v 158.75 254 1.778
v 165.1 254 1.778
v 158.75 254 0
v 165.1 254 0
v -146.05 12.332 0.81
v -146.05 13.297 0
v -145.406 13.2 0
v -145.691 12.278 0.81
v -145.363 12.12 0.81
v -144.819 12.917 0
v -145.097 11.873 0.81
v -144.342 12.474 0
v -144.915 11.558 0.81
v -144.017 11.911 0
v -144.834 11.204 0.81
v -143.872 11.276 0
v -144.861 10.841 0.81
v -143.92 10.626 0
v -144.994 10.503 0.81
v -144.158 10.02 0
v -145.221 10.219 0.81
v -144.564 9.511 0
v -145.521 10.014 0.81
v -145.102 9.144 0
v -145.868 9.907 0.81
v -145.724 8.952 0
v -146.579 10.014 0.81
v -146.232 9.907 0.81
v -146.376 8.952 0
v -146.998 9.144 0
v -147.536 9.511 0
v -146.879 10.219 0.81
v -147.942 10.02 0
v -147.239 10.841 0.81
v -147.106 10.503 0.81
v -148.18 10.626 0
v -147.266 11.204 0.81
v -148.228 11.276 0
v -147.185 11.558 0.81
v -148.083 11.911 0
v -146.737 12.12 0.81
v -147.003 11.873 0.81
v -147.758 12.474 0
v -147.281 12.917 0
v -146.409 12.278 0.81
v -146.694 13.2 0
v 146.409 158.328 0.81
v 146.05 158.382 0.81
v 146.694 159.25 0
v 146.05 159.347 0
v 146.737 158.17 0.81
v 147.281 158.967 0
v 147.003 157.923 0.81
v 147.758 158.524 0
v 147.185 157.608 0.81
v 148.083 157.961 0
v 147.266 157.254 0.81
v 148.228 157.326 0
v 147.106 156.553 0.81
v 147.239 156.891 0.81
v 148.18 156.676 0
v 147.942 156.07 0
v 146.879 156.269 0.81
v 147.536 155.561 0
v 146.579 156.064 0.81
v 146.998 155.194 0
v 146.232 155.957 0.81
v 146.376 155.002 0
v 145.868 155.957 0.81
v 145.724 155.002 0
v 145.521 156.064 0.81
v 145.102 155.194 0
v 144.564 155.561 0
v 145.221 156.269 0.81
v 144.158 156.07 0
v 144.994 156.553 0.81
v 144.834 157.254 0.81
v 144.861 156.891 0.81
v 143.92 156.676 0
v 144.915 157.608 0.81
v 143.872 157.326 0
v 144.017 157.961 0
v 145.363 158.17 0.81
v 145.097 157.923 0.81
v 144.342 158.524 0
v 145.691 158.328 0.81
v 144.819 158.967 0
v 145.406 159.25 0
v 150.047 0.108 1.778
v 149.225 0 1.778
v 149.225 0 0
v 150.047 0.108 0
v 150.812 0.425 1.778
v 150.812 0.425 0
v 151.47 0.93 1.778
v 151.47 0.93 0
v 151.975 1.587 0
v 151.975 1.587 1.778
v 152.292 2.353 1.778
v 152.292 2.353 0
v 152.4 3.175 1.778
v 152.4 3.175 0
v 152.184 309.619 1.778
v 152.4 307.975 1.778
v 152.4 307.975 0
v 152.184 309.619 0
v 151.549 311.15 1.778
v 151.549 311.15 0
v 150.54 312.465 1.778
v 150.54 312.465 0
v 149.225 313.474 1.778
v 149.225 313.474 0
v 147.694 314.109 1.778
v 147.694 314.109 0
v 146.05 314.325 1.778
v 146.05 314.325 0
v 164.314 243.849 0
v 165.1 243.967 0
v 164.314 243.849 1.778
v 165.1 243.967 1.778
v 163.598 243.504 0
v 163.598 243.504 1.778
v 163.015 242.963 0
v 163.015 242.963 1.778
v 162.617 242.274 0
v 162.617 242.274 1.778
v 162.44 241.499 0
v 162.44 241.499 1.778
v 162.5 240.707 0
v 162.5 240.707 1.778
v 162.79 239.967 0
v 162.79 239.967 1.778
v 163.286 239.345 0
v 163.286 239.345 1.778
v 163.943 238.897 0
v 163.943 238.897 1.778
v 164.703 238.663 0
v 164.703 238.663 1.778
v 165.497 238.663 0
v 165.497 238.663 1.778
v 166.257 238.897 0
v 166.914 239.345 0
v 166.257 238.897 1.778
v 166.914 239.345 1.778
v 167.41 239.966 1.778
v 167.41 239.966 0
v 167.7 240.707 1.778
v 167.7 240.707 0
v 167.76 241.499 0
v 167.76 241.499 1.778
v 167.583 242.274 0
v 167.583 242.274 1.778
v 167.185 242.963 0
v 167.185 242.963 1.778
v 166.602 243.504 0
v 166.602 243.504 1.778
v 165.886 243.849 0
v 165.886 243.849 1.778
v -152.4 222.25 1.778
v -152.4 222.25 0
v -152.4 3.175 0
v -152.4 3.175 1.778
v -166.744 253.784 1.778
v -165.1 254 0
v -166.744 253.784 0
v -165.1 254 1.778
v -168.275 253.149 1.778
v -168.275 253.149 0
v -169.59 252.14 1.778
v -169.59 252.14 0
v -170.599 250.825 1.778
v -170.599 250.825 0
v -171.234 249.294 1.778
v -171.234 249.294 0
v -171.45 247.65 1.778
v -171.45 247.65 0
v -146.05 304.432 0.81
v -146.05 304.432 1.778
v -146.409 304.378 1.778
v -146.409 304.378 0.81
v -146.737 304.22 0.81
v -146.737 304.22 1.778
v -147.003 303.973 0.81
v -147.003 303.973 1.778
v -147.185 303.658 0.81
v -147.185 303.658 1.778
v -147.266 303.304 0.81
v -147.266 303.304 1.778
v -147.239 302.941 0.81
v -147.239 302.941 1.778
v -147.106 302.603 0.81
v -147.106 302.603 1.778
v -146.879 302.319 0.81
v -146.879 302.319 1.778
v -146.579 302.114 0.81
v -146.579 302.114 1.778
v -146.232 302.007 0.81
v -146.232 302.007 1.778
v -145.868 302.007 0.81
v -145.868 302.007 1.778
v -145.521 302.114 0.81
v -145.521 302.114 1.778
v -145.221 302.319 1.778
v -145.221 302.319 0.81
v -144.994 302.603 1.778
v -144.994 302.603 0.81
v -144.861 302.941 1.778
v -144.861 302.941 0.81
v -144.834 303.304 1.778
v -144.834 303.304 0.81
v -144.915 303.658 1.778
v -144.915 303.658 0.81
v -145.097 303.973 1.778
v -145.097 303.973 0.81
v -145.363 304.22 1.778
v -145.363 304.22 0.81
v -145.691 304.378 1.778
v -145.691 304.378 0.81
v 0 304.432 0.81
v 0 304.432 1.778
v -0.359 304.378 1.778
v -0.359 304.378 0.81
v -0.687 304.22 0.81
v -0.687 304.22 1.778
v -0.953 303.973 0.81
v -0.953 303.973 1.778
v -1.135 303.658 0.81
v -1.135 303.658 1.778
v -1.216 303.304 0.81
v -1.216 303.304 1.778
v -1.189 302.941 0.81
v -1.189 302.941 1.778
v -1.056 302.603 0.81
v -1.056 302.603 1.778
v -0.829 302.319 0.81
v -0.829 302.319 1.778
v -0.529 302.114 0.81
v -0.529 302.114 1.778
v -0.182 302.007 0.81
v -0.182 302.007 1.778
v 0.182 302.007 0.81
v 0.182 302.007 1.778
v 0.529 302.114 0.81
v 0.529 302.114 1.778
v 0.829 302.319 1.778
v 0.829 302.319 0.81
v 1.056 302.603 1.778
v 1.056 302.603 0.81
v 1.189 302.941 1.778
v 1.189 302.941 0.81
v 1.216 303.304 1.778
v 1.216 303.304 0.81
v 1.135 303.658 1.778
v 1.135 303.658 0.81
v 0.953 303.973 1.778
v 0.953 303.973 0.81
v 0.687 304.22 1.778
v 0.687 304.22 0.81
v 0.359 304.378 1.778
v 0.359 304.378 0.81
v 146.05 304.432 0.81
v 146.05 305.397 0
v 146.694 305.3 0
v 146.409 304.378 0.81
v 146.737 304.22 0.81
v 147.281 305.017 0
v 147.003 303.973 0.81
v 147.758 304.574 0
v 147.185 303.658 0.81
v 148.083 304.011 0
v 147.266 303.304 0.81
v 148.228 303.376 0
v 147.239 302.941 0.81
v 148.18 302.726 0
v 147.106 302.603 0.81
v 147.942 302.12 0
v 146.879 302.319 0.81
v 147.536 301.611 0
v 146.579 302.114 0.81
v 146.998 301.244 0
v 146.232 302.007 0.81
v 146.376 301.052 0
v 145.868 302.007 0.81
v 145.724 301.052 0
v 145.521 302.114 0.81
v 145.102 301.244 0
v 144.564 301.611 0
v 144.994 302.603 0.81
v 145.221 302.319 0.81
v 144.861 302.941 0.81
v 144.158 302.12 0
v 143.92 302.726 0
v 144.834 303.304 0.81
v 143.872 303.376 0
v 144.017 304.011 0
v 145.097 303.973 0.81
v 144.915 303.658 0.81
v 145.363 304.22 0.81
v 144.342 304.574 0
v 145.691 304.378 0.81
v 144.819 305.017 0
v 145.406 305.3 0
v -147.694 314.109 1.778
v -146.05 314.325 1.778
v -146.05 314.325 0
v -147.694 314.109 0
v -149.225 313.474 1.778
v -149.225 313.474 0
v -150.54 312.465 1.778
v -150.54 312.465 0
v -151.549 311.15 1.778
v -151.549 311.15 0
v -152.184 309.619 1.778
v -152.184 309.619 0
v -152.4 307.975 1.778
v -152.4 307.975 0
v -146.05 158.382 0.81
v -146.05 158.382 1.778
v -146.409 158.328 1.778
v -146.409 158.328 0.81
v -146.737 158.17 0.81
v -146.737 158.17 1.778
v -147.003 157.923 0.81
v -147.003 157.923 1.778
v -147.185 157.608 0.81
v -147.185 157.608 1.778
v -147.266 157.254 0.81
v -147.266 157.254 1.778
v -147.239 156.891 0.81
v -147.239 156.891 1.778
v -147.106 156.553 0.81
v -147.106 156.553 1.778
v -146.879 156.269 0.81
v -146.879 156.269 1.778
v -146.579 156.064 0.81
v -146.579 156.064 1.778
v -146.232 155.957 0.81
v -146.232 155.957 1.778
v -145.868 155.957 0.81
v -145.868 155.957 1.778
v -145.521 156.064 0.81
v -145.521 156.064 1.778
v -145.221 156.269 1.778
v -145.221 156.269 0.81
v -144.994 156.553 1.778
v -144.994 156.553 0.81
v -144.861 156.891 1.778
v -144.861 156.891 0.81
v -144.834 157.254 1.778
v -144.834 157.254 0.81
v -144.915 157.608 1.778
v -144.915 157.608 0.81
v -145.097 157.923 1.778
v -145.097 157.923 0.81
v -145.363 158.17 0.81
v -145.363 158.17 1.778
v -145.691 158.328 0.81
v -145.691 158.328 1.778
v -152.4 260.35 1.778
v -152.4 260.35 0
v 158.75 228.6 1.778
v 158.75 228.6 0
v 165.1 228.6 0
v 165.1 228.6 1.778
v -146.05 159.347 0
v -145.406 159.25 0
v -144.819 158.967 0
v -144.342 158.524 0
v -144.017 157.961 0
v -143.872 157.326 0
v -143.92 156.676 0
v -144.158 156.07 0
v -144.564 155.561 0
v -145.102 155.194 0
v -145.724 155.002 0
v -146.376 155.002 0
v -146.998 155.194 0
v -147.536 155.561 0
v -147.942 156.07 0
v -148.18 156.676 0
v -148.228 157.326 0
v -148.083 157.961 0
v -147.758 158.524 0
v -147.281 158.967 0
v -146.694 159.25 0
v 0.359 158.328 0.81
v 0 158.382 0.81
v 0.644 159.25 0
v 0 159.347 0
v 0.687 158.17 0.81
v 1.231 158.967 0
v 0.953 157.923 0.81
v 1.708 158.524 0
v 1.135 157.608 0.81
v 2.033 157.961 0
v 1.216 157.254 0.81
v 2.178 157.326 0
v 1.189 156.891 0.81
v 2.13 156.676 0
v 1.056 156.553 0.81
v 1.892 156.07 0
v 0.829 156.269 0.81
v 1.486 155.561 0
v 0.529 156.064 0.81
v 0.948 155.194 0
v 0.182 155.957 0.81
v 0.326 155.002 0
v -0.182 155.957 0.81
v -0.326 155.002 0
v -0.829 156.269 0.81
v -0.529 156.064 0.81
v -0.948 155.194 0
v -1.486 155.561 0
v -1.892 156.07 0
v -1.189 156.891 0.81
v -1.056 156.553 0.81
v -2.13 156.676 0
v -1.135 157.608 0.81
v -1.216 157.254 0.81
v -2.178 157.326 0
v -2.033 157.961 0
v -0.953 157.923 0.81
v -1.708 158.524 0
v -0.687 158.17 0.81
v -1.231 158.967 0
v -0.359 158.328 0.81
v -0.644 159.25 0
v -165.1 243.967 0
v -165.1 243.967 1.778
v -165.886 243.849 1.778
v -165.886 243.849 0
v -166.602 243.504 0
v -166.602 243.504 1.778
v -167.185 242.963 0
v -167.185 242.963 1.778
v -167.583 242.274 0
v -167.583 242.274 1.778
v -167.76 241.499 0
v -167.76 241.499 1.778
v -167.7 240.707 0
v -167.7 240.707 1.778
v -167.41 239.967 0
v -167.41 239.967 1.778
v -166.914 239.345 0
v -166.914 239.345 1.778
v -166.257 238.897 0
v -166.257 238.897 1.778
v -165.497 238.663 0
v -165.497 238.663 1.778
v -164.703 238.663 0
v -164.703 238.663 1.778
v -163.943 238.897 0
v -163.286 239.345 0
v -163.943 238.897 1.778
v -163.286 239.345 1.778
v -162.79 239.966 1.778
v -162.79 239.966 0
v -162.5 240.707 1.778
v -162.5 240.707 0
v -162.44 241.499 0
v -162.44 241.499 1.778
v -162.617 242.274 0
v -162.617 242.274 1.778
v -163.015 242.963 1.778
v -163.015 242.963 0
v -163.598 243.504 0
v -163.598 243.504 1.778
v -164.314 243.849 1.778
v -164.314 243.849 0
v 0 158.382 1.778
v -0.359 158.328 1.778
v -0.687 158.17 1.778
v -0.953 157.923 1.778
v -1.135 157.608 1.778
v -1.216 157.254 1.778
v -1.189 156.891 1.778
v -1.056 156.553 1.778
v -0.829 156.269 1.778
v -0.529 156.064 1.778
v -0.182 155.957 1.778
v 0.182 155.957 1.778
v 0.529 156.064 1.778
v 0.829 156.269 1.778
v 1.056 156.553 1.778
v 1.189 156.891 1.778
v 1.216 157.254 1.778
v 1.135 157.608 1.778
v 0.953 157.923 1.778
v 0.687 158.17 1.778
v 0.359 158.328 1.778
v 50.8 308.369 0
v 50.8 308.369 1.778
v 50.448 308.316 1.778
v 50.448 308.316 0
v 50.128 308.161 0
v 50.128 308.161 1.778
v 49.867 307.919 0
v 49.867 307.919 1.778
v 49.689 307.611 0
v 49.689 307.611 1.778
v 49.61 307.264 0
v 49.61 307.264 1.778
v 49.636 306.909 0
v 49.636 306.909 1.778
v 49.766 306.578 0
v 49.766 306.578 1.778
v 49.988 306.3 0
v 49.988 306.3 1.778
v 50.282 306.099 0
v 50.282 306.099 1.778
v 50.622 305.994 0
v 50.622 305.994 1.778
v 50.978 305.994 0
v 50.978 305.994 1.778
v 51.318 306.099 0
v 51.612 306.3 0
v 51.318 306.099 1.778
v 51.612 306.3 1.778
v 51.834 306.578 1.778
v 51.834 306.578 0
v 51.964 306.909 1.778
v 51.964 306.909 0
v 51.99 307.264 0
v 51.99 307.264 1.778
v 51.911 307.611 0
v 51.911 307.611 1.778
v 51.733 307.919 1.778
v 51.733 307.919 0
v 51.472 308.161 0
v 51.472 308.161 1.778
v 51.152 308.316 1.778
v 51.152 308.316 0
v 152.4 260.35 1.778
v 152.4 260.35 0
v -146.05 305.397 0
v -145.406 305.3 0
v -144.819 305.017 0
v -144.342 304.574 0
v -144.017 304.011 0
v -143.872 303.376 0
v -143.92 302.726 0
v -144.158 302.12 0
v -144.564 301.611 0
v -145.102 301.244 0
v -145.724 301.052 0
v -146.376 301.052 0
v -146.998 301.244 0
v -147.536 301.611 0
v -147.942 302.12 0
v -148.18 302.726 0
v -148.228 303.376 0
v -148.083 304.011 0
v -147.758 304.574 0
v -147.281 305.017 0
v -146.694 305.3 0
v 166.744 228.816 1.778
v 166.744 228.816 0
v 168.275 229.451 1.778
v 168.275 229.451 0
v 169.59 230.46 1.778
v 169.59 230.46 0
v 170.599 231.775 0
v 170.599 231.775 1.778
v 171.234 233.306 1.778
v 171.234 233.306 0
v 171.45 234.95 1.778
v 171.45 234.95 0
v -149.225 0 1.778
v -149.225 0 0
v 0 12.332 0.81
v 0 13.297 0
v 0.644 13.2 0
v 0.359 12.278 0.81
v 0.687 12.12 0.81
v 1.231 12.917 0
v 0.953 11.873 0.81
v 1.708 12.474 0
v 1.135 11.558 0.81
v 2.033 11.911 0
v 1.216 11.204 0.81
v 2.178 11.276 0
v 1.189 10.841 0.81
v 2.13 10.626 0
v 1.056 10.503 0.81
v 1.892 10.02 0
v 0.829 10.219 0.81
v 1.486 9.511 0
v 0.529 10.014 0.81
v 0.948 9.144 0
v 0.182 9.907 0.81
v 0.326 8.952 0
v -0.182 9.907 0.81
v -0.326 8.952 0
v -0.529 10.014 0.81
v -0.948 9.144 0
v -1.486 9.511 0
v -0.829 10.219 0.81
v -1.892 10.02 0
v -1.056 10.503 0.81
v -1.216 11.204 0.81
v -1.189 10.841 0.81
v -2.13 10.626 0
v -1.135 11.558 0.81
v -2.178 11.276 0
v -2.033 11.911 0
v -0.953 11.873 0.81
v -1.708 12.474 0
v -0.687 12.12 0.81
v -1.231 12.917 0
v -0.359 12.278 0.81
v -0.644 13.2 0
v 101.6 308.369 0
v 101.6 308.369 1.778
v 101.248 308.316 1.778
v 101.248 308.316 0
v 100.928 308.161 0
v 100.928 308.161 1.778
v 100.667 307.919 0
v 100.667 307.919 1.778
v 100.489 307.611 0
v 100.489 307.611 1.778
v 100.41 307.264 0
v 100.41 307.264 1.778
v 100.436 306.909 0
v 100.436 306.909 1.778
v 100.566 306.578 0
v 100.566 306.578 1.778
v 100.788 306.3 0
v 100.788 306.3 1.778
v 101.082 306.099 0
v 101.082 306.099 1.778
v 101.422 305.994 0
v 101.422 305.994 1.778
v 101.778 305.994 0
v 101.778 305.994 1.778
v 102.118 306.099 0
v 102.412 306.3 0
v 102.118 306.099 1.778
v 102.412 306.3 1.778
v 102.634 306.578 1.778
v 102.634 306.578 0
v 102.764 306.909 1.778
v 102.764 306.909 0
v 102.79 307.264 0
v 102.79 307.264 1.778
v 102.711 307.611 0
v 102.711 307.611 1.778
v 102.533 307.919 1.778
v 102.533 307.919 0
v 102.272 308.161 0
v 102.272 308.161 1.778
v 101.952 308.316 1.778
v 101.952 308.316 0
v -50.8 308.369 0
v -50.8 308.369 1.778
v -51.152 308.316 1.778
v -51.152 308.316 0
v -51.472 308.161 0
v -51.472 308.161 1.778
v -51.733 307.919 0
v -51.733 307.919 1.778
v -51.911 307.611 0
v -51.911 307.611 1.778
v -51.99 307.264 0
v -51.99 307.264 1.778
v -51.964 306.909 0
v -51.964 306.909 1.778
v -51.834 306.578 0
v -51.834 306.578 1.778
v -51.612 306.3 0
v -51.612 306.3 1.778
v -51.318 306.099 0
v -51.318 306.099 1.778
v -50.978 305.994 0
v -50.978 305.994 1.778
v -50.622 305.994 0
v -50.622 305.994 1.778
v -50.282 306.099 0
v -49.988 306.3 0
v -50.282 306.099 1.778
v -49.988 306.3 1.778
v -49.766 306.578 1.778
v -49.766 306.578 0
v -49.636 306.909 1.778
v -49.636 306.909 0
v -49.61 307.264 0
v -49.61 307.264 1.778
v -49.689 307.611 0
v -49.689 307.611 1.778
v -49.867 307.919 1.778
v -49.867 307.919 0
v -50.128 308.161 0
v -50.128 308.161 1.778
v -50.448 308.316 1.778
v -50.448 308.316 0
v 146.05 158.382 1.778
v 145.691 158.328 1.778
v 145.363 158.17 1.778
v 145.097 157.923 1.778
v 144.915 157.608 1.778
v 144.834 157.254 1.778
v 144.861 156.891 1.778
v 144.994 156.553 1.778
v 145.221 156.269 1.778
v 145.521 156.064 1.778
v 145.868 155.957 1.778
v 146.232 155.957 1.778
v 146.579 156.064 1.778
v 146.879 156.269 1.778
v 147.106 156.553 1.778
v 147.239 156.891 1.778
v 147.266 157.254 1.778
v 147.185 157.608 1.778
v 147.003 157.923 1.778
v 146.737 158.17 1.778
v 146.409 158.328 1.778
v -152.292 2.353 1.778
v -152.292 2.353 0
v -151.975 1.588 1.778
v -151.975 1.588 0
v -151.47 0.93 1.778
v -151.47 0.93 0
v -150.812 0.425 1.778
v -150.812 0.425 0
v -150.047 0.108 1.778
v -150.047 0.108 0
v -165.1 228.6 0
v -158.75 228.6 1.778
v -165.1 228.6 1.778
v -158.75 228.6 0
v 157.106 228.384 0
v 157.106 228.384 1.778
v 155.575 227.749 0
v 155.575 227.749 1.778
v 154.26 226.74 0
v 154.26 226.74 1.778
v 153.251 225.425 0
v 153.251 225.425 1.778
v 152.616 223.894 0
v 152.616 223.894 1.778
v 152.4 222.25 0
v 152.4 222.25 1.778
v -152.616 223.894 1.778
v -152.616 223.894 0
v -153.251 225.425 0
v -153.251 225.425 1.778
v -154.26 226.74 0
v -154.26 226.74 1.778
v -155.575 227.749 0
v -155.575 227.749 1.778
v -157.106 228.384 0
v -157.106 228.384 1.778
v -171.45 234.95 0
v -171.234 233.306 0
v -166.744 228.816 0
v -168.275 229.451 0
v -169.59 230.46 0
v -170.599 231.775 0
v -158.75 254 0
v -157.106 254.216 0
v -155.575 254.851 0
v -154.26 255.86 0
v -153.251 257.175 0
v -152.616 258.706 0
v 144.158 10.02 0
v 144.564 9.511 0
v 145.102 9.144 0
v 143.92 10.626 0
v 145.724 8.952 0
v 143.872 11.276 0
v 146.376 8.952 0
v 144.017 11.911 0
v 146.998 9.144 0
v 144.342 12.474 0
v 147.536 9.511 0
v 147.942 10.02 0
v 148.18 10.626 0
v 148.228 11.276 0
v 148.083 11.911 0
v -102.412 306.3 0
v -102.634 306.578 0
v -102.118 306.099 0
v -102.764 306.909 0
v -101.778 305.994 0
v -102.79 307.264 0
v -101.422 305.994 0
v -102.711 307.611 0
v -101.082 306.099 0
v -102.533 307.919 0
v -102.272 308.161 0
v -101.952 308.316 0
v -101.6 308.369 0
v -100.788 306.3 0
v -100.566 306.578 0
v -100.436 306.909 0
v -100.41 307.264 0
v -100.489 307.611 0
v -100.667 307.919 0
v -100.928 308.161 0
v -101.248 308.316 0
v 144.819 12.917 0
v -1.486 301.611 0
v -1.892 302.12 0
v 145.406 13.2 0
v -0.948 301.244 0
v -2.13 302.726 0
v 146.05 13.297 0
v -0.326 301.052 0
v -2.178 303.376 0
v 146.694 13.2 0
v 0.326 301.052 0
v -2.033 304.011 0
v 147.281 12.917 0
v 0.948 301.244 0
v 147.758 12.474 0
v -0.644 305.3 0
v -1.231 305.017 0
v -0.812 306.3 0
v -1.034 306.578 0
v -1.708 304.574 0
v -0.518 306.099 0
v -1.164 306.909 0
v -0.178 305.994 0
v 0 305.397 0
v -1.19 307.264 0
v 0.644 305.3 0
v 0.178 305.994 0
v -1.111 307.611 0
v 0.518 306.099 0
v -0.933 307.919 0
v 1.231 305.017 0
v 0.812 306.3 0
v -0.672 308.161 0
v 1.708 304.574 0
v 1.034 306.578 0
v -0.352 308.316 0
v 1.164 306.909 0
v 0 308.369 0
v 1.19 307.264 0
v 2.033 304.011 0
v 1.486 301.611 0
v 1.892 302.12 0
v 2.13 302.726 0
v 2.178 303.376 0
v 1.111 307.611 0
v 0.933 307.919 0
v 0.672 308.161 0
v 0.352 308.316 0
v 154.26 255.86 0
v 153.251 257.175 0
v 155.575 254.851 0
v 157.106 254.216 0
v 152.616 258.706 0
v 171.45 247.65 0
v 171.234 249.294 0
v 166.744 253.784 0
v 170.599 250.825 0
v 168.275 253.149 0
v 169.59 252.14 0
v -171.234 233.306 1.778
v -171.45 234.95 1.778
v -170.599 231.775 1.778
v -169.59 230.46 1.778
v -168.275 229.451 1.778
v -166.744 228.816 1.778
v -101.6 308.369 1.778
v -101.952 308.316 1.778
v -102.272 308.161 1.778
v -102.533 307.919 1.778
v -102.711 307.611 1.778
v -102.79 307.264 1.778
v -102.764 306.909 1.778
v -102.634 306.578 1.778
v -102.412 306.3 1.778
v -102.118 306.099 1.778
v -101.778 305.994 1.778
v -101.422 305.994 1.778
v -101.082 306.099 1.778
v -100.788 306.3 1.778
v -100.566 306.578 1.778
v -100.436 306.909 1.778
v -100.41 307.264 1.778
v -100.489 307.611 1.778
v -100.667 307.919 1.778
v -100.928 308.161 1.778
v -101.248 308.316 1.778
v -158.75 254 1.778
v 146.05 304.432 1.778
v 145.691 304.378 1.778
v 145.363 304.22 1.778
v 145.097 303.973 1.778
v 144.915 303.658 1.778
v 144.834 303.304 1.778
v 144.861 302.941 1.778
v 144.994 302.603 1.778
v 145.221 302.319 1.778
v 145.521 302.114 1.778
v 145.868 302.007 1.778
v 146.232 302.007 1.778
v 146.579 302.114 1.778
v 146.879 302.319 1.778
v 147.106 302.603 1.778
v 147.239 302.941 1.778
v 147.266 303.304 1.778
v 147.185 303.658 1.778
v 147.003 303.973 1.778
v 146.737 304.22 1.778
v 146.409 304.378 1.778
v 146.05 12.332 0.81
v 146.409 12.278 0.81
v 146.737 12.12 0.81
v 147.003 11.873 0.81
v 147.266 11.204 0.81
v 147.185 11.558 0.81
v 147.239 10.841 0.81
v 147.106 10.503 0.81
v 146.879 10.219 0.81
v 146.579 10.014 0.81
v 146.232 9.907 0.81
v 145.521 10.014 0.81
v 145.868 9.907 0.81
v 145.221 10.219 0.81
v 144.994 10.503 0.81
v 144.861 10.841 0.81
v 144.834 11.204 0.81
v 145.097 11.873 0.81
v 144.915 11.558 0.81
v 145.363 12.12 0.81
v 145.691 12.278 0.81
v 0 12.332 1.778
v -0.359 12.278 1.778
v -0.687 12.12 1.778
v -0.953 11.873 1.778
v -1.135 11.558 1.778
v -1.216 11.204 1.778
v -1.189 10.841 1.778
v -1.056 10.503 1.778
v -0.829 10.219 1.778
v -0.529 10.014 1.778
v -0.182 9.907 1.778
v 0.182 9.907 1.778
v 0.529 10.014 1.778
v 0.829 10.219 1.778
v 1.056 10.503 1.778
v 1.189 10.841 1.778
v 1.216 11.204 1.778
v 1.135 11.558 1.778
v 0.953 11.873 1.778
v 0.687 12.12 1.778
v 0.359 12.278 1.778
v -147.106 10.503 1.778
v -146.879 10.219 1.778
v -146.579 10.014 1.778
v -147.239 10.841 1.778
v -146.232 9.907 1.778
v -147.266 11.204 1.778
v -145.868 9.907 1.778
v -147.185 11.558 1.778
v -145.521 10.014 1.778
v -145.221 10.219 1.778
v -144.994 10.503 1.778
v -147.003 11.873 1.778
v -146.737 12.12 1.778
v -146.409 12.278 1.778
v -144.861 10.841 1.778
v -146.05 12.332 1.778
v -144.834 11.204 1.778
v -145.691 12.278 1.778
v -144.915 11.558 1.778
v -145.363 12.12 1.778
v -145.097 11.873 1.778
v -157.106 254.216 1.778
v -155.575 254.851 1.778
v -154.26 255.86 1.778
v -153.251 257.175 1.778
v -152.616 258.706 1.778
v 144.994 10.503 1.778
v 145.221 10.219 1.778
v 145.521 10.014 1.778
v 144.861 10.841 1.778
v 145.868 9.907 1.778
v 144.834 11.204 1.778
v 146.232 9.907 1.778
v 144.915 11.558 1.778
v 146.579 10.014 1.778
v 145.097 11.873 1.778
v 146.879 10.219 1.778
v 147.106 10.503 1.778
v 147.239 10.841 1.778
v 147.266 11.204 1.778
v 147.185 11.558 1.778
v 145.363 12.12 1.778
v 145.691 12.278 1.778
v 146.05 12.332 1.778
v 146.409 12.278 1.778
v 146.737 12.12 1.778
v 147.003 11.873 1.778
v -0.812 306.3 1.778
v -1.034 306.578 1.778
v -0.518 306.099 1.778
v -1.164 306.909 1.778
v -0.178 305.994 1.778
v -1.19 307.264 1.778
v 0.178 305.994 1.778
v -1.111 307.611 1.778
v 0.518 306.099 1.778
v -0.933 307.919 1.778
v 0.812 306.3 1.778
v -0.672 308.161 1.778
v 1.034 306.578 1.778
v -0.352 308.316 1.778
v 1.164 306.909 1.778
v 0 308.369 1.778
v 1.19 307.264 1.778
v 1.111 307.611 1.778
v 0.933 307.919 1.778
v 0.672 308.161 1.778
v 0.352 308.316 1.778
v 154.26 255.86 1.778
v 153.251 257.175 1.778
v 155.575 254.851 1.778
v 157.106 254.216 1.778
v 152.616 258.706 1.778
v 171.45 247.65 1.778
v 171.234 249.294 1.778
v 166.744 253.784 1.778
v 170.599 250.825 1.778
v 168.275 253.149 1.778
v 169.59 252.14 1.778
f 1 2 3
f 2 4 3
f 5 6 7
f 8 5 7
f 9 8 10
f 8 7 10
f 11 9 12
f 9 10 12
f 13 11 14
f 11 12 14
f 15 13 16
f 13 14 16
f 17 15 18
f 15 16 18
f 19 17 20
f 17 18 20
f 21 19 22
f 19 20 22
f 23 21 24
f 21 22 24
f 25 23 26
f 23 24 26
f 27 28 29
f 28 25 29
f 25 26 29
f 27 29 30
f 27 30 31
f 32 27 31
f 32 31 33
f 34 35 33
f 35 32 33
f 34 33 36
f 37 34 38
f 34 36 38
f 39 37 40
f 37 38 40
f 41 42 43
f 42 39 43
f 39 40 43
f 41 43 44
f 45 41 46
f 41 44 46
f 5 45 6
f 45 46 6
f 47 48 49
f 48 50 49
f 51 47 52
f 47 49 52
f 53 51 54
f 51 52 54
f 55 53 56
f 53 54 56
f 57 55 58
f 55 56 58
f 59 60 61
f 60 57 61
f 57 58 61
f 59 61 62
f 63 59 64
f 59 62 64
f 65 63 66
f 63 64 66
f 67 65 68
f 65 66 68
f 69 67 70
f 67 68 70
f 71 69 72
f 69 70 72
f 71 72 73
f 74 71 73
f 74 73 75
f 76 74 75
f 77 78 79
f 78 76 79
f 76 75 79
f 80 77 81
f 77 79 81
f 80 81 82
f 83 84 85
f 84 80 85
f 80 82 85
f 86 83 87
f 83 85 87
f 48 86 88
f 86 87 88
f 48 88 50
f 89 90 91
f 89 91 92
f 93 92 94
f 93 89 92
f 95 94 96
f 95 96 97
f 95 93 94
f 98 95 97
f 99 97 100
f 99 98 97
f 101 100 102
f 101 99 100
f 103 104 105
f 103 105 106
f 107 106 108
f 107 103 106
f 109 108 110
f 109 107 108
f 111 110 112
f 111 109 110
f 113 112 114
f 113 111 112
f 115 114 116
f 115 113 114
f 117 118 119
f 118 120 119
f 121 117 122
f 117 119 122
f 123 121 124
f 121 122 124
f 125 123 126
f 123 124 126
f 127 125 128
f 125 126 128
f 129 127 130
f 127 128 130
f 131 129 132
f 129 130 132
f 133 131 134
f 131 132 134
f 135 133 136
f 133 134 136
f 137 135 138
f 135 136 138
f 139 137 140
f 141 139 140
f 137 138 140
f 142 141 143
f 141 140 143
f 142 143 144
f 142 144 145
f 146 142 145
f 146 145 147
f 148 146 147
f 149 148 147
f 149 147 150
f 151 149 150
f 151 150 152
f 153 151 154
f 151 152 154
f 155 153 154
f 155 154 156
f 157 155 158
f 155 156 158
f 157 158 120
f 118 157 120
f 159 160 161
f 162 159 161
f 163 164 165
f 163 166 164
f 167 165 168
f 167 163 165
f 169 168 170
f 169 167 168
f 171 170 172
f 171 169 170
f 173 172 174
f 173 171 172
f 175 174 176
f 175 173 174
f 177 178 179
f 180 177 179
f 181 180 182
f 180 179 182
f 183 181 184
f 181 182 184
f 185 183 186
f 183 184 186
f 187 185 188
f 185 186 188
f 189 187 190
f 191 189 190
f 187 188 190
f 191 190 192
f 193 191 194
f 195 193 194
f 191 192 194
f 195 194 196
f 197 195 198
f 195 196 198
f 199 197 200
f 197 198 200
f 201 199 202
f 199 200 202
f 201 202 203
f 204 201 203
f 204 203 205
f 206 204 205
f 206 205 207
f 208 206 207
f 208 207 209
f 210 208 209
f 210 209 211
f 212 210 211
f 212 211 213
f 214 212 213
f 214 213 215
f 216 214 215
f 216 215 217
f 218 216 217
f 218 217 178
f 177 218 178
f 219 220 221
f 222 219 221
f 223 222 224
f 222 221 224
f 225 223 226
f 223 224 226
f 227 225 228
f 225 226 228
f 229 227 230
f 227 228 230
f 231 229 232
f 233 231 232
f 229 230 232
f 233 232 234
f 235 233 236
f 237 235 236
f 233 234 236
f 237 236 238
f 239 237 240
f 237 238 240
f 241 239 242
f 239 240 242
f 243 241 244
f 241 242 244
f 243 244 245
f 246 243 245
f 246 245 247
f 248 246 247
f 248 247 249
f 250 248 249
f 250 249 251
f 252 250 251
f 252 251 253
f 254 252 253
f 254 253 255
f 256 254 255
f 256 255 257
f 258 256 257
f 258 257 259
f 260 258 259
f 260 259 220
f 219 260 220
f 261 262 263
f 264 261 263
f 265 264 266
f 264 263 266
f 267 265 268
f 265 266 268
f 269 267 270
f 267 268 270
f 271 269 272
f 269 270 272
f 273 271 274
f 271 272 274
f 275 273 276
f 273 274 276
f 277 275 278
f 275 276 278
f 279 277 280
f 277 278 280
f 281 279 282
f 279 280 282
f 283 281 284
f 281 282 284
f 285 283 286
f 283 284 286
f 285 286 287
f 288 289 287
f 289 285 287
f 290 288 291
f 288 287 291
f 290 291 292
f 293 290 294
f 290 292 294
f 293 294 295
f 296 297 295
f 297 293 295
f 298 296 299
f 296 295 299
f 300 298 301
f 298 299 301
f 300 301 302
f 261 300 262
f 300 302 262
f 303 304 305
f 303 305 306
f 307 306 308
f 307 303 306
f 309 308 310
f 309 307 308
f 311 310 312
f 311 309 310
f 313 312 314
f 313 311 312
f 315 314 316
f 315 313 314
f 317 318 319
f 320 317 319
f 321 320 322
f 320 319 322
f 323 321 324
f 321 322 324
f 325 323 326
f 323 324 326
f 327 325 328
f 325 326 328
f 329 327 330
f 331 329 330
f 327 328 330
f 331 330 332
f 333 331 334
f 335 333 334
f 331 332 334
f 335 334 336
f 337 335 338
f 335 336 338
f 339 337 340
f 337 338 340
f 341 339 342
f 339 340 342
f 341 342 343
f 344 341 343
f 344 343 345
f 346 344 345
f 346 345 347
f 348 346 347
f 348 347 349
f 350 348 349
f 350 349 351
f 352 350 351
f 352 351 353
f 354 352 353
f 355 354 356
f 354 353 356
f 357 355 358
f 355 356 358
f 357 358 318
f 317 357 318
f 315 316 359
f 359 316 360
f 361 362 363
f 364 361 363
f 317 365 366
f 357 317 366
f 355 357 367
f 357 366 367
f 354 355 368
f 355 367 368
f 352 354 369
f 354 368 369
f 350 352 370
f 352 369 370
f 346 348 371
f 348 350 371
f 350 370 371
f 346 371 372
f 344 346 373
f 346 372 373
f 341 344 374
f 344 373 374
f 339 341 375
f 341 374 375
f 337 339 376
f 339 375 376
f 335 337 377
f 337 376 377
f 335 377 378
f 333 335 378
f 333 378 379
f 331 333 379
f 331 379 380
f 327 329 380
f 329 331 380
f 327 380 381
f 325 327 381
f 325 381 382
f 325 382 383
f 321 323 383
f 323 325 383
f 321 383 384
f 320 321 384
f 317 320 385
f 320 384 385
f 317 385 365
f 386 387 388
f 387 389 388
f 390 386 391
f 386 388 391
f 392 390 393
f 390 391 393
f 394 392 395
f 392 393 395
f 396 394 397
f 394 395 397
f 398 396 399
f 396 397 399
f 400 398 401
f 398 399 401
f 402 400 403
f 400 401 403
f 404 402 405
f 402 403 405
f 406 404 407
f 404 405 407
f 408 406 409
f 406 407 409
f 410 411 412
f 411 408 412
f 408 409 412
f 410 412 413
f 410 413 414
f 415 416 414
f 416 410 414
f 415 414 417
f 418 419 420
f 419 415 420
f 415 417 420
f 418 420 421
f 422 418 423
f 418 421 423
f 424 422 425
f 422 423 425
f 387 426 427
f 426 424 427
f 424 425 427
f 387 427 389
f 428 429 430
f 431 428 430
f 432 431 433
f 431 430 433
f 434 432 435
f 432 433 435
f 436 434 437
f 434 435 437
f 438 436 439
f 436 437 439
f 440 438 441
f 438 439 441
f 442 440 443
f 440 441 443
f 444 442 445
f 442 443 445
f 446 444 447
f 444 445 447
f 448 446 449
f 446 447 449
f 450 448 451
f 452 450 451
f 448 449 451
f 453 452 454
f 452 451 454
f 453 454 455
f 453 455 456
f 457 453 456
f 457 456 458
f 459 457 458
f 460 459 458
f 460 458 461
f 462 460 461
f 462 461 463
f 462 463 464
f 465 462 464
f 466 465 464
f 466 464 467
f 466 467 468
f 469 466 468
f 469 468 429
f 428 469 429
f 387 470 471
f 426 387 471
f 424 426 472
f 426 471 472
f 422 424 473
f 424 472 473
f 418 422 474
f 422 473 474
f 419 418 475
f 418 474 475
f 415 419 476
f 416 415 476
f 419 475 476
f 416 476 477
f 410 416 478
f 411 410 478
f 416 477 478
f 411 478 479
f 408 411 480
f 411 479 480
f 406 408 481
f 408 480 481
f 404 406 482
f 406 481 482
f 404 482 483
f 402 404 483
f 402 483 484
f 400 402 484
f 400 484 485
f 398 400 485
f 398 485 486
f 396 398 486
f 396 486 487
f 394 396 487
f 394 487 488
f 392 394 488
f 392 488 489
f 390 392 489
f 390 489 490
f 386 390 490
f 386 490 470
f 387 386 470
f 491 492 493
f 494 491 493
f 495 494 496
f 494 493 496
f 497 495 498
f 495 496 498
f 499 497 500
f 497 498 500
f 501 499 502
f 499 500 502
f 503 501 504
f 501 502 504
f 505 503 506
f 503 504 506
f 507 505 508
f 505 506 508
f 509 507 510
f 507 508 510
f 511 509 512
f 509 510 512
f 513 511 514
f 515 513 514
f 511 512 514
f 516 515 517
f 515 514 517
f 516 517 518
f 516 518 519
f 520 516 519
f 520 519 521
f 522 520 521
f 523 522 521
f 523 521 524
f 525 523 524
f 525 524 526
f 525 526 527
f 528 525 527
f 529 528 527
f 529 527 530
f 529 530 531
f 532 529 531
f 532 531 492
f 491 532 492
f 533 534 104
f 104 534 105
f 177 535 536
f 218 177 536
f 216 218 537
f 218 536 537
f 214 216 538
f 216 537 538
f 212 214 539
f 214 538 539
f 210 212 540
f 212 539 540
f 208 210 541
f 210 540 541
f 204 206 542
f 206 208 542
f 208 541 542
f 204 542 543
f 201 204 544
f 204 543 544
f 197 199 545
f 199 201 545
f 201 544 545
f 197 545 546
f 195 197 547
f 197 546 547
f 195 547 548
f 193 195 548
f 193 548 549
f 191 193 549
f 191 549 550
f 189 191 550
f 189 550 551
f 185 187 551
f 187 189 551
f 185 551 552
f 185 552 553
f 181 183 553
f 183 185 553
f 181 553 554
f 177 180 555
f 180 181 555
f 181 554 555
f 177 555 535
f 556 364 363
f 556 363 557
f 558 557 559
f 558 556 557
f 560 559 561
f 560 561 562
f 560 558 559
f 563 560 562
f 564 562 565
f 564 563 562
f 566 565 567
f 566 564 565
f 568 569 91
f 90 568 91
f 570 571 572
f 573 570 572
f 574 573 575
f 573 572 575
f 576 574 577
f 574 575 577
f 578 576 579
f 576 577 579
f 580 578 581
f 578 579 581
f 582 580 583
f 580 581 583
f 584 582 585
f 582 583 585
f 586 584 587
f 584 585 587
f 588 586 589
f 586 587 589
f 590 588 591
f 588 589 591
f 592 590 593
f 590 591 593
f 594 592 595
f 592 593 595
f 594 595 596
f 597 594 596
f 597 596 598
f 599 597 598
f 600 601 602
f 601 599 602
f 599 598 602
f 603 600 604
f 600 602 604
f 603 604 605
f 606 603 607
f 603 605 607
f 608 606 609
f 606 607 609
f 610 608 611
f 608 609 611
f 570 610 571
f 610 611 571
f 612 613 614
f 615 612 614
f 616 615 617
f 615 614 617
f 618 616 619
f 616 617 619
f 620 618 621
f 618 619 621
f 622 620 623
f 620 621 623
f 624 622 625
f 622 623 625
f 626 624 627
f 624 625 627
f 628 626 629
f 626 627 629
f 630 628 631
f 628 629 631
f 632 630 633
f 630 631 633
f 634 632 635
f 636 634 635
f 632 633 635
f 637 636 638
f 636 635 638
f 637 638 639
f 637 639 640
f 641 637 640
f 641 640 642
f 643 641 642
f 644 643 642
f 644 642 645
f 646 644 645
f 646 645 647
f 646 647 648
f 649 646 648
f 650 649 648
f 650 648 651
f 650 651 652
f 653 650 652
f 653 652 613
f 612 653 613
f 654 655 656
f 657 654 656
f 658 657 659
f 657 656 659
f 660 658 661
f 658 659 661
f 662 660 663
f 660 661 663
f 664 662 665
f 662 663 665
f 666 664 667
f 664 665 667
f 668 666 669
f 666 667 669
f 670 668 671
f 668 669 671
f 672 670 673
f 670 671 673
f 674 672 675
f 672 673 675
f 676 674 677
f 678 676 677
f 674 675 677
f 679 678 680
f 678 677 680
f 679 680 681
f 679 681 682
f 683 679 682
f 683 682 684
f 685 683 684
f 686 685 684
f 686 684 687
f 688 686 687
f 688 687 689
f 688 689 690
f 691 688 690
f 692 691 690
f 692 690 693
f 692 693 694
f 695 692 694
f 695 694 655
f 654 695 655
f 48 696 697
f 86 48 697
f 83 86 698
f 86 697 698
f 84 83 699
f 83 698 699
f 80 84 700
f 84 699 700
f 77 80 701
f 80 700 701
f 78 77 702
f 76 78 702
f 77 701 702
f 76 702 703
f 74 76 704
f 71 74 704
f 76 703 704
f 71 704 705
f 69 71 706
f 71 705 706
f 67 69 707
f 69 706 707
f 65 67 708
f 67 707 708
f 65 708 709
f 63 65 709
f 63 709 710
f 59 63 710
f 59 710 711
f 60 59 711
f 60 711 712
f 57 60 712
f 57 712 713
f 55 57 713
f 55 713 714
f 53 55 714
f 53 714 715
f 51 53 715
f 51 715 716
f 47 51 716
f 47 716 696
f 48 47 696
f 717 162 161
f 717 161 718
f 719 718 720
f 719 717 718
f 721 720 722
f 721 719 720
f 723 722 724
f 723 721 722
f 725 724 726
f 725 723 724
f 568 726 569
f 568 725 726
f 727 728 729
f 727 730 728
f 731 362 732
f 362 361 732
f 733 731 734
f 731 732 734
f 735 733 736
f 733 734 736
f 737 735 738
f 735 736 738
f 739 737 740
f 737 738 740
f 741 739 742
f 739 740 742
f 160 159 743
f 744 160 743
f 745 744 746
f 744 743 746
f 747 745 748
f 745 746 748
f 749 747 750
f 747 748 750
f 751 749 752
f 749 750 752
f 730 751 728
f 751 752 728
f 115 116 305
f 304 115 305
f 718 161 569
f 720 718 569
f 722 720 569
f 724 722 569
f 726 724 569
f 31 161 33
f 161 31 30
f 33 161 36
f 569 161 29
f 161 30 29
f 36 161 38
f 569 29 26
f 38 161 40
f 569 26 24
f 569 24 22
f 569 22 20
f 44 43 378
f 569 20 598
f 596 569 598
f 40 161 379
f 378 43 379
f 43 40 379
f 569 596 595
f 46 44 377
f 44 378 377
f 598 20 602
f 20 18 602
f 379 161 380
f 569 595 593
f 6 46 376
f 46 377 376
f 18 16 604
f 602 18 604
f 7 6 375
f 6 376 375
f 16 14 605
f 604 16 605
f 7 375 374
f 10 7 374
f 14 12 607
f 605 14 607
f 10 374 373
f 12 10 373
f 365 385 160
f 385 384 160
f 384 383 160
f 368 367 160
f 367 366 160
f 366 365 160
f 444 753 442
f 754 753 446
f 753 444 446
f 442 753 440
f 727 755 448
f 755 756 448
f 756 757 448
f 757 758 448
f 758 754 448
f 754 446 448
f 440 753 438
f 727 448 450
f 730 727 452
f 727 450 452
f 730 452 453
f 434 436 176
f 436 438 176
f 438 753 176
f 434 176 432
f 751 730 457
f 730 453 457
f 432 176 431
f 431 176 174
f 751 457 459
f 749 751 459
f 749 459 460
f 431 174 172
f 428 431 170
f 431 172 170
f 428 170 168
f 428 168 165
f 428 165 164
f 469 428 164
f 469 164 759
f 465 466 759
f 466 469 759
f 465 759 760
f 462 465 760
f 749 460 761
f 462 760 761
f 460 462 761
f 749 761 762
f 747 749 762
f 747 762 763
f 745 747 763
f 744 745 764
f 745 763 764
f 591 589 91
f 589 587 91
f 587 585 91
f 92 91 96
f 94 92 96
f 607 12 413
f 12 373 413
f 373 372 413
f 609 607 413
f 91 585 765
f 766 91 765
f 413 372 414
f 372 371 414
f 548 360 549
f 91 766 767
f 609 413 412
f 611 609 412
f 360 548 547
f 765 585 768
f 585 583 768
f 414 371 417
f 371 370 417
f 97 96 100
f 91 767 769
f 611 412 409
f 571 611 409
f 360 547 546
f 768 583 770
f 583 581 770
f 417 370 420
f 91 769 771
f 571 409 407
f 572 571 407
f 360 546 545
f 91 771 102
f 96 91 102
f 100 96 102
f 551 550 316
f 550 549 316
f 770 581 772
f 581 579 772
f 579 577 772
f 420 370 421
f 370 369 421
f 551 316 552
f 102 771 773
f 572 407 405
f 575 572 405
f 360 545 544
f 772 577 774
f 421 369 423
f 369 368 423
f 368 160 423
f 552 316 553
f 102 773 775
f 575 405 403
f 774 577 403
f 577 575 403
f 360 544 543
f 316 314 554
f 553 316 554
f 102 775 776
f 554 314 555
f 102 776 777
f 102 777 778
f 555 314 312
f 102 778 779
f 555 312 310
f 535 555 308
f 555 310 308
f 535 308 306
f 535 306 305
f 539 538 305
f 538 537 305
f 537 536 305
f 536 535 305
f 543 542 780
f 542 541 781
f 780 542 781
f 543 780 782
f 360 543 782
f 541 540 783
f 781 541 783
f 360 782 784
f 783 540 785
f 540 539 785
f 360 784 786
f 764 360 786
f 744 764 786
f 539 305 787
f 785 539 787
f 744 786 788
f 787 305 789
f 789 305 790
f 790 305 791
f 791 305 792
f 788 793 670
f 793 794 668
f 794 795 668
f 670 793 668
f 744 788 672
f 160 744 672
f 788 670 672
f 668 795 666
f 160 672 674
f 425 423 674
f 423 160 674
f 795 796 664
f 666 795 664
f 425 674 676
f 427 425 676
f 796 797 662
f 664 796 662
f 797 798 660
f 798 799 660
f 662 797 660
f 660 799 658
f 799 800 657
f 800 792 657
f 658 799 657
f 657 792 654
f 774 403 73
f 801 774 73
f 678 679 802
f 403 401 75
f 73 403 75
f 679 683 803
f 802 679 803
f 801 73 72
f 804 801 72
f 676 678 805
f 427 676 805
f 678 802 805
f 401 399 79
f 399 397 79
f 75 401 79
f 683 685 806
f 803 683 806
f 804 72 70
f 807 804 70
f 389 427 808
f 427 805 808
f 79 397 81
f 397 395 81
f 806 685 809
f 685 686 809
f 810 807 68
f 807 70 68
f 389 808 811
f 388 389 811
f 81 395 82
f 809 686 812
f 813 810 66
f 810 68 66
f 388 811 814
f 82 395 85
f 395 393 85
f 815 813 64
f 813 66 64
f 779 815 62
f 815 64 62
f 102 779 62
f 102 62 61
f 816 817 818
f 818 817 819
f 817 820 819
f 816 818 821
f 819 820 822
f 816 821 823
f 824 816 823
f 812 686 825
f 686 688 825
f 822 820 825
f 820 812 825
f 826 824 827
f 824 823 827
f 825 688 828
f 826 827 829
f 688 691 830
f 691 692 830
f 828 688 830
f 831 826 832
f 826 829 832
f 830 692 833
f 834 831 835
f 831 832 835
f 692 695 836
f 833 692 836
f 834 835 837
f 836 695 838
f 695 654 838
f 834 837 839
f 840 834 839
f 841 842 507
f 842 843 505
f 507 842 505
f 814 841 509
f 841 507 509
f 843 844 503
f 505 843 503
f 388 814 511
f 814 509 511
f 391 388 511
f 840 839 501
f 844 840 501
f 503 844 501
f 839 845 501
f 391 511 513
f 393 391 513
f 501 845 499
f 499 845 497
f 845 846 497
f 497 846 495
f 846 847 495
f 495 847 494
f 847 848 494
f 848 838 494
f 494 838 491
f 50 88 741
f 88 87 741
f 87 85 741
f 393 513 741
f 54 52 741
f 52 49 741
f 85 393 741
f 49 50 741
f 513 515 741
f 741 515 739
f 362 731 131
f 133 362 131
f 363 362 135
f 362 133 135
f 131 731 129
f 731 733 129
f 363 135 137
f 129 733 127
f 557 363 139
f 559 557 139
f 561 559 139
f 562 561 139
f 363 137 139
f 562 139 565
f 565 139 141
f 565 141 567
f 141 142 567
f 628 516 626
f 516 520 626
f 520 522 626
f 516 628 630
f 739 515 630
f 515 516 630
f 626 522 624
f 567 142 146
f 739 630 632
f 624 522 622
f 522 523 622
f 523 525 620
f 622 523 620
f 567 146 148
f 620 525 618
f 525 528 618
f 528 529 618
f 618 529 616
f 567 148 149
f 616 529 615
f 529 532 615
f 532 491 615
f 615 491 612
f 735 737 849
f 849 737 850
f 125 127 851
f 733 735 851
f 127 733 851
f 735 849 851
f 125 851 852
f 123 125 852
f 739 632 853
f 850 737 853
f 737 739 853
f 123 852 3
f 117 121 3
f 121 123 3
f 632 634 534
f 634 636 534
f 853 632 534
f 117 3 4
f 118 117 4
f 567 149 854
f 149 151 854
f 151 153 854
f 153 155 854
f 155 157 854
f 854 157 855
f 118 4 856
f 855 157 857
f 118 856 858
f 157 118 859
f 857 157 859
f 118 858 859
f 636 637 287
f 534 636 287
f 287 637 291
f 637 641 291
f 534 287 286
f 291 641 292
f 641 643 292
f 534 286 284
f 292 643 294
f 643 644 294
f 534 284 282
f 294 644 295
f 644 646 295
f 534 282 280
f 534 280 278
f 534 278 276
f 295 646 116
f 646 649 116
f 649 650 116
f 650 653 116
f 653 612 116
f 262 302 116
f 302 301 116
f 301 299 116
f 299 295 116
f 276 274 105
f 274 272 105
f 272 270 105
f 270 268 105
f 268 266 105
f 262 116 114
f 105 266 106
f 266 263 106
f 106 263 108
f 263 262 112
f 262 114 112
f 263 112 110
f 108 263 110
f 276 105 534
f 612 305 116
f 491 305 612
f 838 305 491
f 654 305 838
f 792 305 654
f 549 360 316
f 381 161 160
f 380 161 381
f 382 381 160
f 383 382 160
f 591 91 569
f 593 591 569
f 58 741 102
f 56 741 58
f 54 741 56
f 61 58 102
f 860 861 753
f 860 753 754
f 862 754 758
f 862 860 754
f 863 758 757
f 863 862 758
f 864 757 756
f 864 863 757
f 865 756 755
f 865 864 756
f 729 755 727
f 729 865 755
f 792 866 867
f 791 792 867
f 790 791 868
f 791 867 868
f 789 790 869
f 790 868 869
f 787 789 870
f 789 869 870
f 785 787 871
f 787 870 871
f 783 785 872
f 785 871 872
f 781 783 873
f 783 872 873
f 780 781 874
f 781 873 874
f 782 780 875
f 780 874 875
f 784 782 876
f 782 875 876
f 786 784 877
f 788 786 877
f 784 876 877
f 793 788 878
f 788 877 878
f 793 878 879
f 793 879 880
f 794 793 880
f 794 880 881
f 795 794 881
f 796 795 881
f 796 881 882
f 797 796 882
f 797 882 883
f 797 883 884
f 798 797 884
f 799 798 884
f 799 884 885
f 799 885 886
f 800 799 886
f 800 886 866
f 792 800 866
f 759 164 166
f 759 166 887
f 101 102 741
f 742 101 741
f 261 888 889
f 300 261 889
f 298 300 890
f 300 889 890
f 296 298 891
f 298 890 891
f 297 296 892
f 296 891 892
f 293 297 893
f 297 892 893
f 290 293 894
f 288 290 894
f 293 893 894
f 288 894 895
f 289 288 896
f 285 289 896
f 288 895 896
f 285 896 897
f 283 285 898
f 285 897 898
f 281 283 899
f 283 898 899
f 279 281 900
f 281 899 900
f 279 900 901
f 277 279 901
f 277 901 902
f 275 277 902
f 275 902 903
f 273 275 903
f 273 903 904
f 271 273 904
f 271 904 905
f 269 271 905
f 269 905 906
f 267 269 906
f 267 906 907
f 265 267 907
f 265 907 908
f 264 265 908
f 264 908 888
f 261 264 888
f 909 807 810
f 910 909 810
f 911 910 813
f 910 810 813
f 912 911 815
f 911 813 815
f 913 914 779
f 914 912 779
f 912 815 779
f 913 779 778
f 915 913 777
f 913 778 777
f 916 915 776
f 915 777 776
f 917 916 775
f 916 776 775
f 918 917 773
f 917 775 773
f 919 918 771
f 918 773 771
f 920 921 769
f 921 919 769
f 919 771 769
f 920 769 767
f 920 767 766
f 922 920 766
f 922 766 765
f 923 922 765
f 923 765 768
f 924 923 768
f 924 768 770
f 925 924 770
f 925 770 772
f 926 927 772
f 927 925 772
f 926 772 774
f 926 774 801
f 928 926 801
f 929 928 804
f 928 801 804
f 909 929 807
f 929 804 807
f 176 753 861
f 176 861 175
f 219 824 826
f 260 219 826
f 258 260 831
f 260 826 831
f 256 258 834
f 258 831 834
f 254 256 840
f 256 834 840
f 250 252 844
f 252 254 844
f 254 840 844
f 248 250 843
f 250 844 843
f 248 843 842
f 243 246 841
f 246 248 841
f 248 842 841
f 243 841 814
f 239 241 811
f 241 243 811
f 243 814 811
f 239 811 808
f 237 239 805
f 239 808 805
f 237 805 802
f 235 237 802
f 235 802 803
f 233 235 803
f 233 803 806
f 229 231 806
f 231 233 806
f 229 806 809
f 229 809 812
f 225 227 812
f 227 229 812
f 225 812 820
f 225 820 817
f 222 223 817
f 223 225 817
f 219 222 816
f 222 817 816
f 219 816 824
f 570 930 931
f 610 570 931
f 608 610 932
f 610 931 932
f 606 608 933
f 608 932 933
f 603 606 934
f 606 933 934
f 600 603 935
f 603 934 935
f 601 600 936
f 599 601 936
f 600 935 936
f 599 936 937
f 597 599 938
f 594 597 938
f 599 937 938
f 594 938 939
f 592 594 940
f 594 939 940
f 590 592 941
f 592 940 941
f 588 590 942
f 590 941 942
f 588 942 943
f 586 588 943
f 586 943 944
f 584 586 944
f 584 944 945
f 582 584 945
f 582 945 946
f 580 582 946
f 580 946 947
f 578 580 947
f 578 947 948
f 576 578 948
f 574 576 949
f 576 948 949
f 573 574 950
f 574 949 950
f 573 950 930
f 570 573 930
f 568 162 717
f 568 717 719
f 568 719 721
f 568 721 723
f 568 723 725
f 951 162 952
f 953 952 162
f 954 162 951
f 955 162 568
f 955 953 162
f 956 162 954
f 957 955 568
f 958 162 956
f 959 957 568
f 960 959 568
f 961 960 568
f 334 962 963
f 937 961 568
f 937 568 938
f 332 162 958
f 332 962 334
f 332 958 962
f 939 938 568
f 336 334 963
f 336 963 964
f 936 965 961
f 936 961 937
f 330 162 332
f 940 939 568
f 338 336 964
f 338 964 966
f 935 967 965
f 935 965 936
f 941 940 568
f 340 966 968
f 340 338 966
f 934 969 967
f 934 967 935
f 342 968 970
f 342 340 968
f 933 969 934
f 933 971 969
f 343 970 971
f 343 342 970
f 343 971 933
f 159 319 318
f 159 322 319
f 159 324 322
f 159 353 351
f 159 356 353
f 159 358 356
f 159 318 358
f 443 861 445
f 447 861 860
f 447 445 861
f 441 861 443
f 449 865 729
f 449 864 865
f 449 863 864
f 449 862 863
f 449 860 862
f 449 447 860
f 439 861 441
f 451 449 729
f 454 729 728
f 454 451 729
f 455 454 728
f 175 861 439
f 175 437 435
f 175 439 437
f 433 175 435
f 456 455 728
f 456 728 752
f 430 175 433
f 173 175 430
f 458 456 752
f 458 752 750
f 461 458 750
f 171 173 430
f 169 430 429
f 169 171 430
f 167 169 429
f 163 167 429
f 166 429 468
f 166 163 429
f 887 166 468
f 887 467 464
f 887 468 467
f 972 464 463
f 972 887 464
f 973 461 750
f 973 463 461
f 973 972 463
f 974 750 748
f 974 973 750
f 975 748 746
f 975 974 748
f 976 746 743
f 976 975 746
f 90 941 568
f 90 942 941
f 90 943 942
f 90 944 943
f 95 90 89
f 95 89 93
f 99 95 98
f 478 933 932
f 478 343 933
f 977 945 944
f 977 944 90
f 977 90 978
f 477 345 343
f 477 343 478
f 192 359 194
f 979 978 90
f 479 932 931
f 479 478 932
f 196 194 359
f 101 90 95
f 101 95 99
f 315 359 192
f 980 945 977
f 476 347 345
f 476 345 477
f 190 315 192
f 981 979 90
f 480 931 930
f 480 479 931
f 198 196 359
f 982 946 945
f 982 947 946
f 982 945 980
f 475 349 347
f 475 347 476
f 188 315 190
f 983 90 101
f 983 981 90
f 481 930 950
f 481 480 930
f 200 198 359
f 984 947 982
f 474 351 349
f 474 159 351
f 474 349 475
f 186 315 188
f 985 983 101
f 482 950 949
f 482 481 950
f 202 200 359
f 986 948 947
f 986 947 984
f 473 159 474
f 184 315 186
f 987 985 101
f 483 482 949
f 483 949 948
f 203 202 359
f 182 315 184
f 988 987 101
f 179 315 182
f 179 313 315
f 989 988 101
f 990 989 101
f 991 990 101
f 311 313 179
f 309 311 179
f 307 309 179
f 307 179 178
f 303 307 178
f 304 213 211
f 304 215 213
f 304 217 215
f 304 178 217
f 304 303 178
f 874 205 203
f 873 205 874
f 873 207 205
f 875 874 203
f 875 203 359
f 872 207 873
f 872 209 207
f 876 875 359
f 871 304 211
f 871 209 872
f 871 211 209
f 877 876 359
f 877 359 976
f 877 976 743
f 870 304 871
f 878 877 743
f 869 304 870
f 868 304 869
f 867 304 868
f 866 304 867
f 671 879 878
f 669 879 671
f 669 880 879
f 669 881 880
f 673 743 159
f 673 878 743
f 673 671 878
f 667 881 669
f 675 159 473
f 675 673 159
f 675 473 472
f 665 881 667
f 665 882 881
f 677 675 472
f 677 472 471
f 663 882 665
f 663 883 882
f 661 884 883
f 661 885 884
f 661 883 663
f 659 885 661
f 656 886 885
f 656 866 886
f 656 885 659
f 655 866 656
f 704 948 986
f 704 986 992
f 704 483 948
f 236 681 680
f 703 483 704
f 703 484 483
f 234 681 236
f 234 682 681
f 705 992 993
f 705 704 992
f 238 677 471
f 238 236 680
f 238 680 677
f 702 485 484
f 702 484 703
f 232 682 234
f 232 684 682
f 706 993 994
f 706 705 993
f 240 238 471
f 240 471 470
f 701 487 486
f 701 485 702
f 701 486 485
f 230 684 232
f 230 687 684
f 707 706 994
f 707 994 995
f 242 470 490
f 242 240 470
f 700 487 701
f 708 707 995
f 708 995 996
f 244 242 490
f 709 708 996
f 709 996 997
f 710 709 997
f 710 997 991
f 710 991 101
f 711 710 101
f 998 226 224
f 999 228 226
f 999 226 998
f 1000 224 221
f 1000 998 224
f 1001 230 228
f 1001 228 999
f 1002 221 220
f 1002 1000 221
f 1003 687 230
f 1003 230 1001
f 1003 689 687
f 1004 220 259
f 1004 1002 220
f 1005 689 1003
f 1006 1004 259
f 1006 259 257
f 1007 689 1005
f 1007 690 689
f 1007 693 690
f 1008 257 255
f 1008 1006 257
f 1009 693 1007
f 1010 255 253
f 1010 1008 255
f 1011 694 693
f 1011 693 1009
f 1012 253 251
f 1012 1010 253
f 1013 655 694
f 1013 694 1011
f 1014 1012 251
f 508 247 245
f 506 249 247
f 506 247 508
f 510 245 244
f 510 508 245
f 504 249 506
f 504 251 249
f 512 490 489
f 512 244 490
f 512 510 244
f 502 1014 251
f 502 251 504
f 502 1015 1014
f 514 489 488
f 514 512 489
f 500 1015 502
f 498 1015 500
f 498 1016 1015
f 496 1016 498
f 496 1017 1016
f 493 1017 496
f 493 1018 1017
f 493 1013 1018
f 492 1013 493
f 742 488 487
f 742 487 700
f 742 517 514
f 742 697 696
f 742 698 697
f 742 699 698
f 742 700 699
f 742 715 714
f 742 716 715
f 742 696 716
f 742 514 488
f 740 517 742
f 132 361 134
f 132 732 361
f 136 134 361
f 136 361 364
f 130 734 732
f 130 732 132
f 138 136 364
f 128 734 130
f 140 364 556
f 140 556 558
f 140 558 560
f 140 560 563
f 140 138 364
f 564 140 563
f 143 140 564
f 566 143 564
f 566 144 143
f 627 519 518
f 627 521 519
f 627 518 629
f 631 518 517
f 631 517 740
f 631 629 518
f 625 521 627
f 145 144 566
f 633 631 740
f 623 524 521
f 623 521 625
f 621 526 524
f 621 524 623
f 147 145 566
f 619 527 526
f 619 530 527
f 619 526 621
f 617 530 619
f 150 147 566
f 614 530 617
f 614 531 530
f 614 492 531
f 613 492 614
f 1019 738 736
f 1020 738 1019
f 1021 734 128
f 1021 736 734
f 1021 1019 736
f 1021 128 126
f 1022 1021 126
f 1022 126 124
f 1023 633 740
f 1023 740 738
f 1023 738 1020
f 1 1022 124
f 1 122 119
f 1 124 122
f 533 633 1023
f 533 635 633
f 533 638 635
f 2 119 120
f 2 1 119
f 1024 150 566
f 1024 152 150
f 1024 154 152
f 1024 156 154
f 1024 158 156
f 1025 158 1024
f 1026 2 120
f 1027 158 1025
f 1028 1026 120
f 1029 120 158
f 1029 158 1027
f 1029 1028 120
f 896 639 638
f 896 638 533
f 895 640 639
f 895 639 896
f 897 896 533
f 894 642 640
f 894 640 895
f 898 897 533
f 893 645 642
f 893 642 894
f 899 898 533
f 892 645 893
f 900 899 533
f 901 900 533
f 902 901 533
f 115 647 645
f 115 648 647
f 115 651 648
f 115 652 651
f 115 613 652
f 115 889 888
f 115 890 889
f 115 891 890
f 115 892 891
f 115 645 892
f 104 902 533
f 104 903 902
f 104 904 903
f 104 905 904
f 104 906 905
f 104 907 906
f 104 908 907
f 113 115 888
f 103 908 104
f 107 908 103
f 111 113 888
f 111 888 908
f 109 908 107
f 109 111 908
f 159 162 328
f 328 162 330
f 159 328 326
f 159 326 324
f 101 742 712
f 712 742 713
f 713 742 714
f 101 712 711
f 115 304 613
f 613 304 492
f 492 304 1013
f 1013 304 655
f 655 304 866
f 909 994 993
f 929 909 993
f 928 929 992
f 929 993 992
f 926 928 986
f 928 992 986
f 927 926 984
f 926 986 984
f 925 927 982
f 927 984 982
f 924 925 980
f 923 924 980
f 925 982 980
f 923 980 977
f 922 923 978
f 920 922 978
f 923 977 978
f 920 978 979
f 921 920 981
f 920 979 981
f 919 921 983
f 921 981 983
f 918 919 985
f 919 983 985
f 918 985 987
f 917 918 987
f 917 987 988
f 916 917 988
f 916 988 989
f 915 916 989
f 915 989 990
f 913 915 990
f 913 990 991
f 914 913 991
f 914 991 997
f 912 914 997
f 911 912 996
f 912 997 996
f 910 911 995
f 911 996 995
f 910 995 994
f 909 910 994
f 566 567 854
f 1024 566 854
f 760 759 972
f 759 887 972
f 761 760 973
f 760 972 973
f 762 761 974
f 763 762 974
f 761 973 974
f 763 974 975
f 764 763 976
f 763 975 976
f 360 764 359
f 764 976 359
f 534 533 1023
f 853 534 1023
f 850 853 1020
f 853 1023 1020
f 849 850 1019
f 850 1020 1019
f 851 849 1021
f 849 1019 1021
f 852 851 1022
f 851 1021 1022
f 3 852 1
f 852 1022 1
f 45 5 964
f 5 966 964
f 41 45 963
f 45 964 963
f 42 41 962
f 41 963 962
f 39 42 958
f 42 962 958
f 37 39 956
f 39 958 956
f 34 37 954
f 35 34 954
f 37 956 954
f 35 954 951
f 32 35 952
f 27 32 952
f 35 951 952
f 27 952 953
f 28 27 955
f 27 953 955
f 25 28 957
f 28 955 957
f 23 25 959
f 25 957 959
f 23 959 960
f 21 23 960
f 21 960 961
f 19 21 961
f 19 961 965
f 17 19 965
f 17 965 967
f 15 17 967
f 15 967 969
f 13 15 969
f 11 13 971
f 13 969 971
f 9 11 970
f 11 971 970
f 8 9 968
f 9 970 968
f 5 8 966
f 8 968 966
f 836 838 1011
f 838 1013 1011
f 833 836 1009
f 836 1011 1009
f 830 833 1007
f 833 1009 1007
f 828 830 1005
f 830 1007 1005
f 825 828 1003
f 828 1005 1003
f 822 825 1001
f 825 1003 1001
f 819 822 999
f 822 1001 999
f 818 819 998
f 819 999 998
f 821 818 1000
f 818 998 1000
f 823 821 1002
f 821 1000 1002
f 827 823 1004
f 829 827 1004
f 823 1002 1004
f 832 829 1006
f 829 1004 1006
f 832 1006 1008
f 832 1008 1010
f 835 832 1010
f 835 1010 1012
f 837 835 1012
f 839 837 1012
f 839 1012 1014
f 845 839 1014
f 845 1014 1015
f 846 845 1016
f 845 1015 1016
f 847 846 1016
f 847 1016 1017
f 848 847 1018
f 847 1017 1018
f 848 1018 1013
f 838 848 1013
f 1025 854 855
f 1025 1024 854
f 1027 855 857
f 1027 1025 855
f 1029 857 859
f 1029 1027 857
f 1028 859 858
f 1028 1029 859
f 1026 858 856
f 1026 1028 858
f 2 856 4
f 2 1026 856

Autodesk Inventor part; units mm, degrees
ref_plane "YZ Plane" through (0, 0, 0) normal (1, 0, 0) x (0, 1, 0)
ref_plane "XZ Plane" through (0, 0, 0) normal (0, 1, 0) x (-1, 0, 0)
ref_plane "XY Plane" through (0, 0, 0) normal (0, 0, 1) x (1, 0, 0)
sketch "Sketch1" plane through (0, 0, 0) normal (0, 0, 1) x (1, 0, 0)
  line L0 (-240.03, 0) -> (240.03, 0)
  line L1 (0, 377.19) -> (0, -62.865)
  line L2 (152.4, 314.325) -> (-152.4, 314.325)
  line L3 (-152.4, 314.325) -> (-152.4, 0)
  line L4 (-152.4, 0) -> (152.4, 0)
  line L5 (152.4, 0) -> (152.4, 314.325)
  line L6 (152.4, 314.325) -> (-152.4, 0) construction
  line L7 (-152.4, 314.325) -> (152.4, 0) construction
  line L8 (-152.4, 228.6) -> (-171.45, 228.6)
  line L9 (-171.45, 228.6) -> (-171.45, 254)
  line L10 (-171.45, 254) -> (-152.4, 254)
  line L11 (-152.4, 254) -> (-152.4, 228.6)
  line L12 (152.4, 228.6) -> (171.45, 228.6)
  line L13 (171.45, 228.6) -> (171.45, 254)
  line L14 (171.45, 254) -> (152.4, 254)
  line L15 (152.4, 254) -> (152.4, 228.6)
  point P0 (0, 0)
  point P1 (0, 157.1625)
  point P2 (-165.1, 241.3)
  point P3 (165.1, 241.3)
  point P4 (101.6, 307.1749)
  point P5 (0, 307.1749)
  point P6 (-101.6, 307.1749)
  point P7 (-50.8, 307.1749)
  point P8 (50.8, 307.1749)
  dimension "d0" = 304.8
  dimension "d1" = 165.1
  dimension "d2" = 165.1
  dimension "d3" = 25.4
  dimension "d4" = 12.7
  dimension "d5" = 19.05
  dimension "d6" = 241.3
  dimension "d7" = 314.325
  dimension "d17" = 101.6
  dimension "d18" = 101.6
  dimension "d19" = 7.1501
  dimension "d29" = 50.8
  dimension "d30" = 50.8
extrude "Extrusion1" add sketch "Sketch1" along normal blind 1.778
hole "Hole1" at (-165.1, 241.3, 0) at (165.1, 241.3, 0) direction (0, 0, 1) diameter 5.334 end through all
fillet "Fillet1" radius 3.175 2 edges at (152.4, 0, 0.889) (-152.4, 0, 0.889)
hole "Hole2" at (101.6, 307.1749, 0) at (0, 307.1749, 0) at (-101.6, 307.1749, 0) at (-50.8, 307.1749, 0) at (50.8, 307.1749, 0) direction (0, 0, 1) diameter 2.3876 end through all
fillet "Fillet2" radius 6.35 10 edges at (152.4, 228.6, 0.889) (171.45, 228.6, 0.889) (171.45, 254, 0.889) (152.4, 254, 0.889) (152.4, 314.325, 0.889) (-152.4, 314.325, 0.889) (-152.4, 254, 0.889) (-171.45, 254, 0.889) (-171.45, 228.6, 0.889) (-152.4, 228.6, 0.889)
sketch "Sketch2" plane through (0, 0, 0) normal (0, 0, 1) x (1, 0, 0)
  line L0 (0, 377.19) -> (0, -62.865)
  line L1 (-152.4, 314.325) -> (152.4, 0) construction
  line L2 (152.4, 314.325) -> (-152.4, 0) construction
  line L3 (-146.05, 11.1125) -> (146.05, 11.1125) construction
  line L4 (146.05, 11.1125) -> (146.05, 303.2125) construction
  line L5 (146.05, 303.2125) -> (-146.05, 303.2125) construction
  line L6 (-146.05, 303.2125) -> (-146.05, 11.1125) construction
  line L7 (-146.05, 11.1125) -> (146.05, 303.2125) construction
  line L8 (146.05, 11.1125) -> (-146.05, 303.2125) construction
  point P0 (0, 0)
  point P1 (0, 157.1625)
  point P2 (0, 303.2125)
  point P3 (-146.05, 157.1625)
  point P4 (0, 11.1125)
  point P5 (0, 157.1625)
  point P6 (146.05, 157.1625)
  dimension "d31" = 292.1
  dimension "d32" = 292.1
hole "Hole3" at (-146.05, 11.1125, 0) at (146.05, 11.1125, 0) at (146.05, 303.2125, 0) at (-146.05, 303.2125, 0) at (146.05, 157.1625, 0) at (0, 11.1125, 0) at (0, 157.1625, 0) at (-146.05, 157.1625, 0) at (0, 303.2125, 0) direction (0, 0, 1) diameter 2.4384 end through all countersink diameter 4.3688 countersink angle 100
equation "\"d2\" = d1"
equation "\"d4\" = 0.5 * d3"
